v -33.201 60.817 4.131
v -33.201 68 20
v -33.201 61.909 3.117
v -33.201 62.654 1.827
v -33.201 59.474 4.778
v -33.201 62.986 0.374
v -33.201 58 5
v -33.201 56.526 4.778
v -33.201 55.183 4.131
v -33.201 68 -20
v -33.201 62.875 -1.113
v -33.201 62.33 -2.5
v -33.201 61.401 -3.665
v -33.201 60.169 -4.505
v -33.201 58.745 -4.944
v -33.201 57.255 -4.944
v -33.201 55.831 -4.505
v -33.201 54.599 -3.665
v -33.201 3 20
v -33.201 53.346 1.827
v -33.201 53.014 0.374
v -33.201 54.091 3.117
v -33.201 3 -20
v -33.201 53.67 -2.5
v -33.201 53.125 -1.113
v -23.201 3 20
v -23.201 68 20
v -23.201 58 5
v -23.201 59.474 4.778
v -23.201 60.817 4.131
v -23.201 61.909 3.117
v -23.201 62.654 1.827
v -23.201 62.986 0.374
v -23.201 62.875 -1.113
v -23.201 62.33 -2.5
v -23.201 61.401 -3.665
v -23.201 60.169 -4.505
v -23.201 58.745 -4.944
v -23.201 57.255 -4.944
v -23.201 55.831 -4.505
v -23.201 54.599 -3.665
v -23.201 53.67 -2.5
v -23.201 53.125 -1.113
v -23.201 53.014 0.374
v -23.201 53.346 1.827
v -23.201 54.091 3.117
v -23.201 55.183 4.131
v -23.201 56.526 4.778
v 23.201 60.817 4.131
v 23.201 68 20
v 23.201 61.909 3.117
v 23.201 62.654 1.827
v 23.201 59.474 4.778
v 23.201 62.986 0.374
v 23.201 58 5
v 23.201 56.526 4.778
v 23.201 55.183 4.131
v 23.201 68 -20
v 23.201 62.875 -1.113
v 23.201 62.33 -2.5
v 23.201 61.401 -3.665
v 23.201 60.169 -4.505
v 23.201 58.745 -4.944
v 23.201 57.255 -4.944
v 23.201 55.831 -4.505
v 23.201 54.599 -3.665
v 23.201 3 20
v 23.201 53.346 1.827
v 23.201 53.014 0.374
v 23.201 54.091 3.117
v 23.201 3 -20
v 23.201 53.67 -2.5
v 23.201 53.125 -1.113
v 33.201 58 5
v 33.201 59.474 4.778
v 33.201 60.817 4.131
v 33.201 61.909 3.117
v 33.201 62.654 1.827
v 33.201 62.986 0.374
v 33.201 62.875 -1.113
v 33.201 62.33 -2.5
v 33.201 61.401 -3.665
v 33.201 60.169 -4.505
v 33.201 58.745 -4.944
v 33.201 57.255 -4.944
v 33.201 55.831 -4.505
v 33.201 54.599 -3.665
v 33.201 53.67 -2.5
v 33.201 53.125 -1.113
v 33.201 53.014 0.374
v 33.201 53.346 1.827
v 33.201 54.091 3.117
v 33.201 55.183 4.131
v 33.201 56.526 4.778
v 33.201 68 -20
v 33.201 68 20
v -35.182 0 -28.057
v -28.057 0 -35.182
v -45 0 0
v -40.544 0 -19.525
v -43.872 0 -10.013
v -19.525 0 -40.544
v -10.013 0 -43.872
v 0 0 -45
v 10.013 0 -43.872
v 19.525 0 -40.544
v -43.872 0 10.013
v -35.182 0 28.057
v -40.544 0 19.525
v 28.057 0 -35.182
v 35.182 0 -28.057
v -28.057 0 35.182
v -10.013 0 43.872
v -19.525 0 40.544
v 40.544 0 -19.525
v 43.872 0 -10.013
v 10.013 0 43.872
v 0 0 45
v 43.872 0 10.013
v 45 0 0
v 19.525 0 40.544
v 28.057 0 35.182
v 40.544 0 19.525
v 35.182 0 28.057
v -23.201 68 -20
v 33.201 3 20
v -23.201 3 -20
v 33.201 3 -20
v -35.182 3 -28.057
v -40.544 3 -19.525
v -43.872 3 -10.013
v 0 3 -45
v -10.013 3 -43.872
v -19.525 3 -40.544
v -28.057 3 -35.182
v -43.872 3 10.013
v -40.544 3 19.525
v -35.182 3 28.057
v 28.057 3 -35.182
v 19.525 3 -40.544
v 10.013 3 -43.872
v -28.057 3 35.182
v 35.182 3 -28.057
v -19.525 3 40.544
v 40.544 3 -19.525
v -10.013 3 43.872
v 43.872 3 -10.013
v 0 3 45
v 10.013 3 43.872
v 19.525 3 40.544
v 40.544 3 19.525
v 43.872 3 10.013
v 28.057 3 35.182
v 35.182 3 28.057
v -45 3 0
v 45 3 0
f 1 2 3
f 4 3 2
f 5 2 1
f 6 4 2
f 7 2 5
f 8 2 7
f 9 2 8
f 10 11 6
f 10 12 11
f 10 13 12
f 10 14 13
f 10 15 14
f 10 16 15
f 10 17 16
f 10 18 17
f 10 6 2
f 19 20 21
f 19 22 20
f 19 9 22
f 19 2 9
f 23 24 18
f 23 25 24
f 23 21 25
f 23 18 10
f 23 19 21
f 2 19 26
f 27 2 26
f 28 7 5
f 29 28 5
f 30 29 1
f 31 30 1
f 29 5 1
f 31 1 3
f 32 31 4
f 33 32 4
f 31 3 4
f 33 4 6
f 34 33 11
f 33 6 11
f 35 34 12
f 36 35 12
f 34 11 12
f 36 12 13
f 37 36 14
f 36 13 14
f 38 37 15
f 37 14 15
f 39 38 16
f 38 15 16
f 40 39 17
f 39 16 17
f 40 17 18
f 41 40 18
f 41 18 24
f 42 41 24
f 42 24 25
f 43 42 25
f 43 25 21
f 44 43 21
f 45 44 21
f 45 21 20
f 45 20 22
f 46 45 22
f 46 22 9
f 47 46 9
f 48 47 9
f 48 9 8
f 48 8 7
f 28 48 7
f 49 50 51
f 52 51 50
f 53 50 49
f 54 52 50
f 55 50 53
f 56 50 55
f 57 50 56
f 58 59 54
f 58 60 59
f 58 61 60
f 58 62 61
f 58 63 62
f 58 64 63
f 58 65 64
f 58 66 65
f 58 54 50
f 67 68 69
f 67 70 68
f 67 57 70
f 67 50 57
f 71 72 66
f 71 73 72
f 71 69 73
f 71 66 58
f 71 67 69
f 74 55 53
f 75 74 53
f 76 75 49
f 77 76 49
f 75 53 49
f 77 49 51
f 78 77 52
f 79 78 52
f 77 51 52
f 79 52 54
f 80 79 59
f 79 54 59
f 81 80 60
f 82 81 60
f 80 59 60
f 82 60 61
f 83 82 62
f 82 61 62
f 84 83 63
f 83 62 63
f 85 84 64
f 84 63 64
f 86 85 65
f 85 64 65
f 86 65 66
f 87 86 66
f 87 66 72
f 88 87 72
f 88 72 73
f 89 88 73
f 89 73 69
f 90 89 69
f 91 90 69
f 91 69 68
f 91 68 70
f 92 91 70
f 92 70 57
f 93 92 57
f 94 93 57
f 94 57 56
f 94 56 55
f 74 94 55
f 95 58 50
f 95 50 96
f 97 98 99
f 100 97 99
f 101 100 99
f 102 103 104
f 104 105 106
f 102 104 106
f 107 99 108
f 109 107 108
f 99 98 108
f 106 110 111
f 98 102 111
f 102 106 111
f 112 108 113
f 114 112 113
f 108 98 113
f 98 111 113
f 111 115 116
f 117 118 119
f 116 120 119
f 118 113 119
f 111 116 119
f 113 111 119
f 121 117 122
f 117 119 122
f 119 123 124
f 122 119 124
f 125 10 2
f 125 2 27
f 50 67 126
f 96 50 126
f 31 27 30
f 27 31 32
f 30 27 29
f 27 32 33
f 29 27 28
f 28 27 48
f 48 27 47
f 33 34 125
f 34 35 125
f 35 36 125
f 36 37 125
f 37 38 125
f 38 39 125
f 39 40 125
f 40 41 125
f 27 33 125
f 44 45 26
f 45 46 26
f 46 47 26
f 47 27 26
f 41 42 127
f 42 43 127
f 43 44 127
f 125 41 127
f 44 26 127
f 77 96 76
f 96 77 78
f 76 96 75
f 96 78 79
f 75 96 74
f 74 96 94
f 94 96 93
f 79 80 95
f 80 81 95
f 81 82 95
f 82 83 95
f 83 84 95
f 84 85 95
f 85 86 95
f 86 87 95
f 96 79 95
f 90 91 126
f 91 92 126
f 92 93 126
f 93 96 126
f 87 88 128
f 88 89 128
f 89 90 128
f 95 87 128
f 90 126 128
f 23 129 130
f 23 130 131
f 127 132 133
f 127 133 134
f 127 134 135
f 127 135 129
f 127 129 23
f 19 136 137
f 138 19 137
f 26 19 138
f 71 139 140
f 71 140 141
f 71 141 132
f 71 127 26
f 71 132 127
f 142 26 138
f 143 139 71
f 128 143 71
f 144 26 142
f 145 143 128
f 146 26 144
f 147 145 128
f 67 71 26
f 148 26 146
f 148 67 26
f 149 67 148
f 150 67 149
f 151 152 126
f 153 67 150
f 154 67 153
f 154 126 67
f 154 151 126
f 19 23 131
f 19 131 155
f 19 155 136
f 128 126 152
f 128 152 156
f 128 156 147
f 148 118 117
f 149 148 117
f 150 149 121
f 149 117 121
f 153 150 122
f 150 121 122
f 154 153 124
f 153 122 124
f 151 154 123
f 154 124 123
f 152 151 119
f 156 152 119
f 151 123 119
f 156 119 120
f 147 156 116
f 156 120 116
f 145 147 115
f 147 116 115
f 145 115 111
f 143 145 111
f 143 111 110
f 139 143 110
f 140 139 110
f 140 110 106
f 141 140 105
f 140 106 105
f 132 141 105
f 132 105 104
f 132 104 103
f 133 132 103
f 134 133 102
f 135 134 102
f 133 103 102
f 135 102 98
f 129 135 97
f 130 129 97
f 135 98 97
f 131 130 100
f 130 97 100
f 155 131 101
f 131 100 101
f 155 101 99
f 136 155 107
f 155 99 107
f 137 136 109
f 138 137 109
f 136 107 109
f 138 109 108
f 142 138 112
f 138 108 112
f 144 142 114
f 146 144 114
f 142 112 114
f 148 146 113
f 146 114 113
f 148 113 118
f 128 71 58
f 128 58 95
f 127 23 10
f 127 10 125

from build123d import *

# Parameters (mm, degrees)
SKETCH1_R           = 45
BOSS_EXTRUDE1_DEPTH = 3
SKETCH2_W           = 10
SKETCH2_H           = 40
BOSS_EXTRUDE2_DEPTH = 65
CUT_EXTRUDE1_REACH  = 114.979
SKETCH3_R           = 5


with BuildPart() as part:
    # Sketch1 → Boss-Extrude1 (new body)
    with BuildSketch(Plane(origin=(0, 0, 0), x_dir=(1, 0, 0), z_dir=(0, 1, 0))):
        with Locations(Location((0, 0, 0), (0, 0, 270))):
            Circle(SKETCH1_R)
    extrude(amount=BOSS_EXTRUDE1_DEPTH)

    # Sketch2 → Boss-Extrude2 (add)
    with BuildSketch(Plane(origin=(0, 3, 0), x_dir=(1, 0, 0), z_dir=(0, 1, 0))):
        with Locations((-28.200807343, 0)):
            Rectangle(SKETCH2_W, SKETCH2_H)
        with Locations((28.200807343, 0)):
            Rectangle(SKETCH2_W, SKETCH2_H)
    extrude(amount=BOSS_EXTRUDE2_DEPTH)

    # Cut-Extrude1: up to this face of the body (flat: up to its plane)
    cut_extrude1_end = Plane(part.part.faces().sort_by_distance((33.200807343, 35.5, 0))[0])
    # Sketch3 → Cut-Extrude1 (cut, up to the picked face)
    with BuildSketch(Plane.ZY.offset(33.200807343), mode=Mode.PRIVATE) as cut_extrude1_sk1:
        with Locations((0, 58)):
            Circle(SKETCH3_R)
    cut_extrude1_tool1 = split(extrude(cut_extrude1_sk1.sketch, amount=-CUT_EXTRUDE1_REACH, mode=Mode.PRIVATE), bisect_by=cut_extrude1_end, keep=Keep.BOTH, mode=Mode.PRIVATE)
    add(cut_extrude1_tool1.solids().sort_by(Axis((-33.200807, 58, 0), (1, 0, 0)))[0], mode=Mode.SUBTRACT)


solid = part.part
